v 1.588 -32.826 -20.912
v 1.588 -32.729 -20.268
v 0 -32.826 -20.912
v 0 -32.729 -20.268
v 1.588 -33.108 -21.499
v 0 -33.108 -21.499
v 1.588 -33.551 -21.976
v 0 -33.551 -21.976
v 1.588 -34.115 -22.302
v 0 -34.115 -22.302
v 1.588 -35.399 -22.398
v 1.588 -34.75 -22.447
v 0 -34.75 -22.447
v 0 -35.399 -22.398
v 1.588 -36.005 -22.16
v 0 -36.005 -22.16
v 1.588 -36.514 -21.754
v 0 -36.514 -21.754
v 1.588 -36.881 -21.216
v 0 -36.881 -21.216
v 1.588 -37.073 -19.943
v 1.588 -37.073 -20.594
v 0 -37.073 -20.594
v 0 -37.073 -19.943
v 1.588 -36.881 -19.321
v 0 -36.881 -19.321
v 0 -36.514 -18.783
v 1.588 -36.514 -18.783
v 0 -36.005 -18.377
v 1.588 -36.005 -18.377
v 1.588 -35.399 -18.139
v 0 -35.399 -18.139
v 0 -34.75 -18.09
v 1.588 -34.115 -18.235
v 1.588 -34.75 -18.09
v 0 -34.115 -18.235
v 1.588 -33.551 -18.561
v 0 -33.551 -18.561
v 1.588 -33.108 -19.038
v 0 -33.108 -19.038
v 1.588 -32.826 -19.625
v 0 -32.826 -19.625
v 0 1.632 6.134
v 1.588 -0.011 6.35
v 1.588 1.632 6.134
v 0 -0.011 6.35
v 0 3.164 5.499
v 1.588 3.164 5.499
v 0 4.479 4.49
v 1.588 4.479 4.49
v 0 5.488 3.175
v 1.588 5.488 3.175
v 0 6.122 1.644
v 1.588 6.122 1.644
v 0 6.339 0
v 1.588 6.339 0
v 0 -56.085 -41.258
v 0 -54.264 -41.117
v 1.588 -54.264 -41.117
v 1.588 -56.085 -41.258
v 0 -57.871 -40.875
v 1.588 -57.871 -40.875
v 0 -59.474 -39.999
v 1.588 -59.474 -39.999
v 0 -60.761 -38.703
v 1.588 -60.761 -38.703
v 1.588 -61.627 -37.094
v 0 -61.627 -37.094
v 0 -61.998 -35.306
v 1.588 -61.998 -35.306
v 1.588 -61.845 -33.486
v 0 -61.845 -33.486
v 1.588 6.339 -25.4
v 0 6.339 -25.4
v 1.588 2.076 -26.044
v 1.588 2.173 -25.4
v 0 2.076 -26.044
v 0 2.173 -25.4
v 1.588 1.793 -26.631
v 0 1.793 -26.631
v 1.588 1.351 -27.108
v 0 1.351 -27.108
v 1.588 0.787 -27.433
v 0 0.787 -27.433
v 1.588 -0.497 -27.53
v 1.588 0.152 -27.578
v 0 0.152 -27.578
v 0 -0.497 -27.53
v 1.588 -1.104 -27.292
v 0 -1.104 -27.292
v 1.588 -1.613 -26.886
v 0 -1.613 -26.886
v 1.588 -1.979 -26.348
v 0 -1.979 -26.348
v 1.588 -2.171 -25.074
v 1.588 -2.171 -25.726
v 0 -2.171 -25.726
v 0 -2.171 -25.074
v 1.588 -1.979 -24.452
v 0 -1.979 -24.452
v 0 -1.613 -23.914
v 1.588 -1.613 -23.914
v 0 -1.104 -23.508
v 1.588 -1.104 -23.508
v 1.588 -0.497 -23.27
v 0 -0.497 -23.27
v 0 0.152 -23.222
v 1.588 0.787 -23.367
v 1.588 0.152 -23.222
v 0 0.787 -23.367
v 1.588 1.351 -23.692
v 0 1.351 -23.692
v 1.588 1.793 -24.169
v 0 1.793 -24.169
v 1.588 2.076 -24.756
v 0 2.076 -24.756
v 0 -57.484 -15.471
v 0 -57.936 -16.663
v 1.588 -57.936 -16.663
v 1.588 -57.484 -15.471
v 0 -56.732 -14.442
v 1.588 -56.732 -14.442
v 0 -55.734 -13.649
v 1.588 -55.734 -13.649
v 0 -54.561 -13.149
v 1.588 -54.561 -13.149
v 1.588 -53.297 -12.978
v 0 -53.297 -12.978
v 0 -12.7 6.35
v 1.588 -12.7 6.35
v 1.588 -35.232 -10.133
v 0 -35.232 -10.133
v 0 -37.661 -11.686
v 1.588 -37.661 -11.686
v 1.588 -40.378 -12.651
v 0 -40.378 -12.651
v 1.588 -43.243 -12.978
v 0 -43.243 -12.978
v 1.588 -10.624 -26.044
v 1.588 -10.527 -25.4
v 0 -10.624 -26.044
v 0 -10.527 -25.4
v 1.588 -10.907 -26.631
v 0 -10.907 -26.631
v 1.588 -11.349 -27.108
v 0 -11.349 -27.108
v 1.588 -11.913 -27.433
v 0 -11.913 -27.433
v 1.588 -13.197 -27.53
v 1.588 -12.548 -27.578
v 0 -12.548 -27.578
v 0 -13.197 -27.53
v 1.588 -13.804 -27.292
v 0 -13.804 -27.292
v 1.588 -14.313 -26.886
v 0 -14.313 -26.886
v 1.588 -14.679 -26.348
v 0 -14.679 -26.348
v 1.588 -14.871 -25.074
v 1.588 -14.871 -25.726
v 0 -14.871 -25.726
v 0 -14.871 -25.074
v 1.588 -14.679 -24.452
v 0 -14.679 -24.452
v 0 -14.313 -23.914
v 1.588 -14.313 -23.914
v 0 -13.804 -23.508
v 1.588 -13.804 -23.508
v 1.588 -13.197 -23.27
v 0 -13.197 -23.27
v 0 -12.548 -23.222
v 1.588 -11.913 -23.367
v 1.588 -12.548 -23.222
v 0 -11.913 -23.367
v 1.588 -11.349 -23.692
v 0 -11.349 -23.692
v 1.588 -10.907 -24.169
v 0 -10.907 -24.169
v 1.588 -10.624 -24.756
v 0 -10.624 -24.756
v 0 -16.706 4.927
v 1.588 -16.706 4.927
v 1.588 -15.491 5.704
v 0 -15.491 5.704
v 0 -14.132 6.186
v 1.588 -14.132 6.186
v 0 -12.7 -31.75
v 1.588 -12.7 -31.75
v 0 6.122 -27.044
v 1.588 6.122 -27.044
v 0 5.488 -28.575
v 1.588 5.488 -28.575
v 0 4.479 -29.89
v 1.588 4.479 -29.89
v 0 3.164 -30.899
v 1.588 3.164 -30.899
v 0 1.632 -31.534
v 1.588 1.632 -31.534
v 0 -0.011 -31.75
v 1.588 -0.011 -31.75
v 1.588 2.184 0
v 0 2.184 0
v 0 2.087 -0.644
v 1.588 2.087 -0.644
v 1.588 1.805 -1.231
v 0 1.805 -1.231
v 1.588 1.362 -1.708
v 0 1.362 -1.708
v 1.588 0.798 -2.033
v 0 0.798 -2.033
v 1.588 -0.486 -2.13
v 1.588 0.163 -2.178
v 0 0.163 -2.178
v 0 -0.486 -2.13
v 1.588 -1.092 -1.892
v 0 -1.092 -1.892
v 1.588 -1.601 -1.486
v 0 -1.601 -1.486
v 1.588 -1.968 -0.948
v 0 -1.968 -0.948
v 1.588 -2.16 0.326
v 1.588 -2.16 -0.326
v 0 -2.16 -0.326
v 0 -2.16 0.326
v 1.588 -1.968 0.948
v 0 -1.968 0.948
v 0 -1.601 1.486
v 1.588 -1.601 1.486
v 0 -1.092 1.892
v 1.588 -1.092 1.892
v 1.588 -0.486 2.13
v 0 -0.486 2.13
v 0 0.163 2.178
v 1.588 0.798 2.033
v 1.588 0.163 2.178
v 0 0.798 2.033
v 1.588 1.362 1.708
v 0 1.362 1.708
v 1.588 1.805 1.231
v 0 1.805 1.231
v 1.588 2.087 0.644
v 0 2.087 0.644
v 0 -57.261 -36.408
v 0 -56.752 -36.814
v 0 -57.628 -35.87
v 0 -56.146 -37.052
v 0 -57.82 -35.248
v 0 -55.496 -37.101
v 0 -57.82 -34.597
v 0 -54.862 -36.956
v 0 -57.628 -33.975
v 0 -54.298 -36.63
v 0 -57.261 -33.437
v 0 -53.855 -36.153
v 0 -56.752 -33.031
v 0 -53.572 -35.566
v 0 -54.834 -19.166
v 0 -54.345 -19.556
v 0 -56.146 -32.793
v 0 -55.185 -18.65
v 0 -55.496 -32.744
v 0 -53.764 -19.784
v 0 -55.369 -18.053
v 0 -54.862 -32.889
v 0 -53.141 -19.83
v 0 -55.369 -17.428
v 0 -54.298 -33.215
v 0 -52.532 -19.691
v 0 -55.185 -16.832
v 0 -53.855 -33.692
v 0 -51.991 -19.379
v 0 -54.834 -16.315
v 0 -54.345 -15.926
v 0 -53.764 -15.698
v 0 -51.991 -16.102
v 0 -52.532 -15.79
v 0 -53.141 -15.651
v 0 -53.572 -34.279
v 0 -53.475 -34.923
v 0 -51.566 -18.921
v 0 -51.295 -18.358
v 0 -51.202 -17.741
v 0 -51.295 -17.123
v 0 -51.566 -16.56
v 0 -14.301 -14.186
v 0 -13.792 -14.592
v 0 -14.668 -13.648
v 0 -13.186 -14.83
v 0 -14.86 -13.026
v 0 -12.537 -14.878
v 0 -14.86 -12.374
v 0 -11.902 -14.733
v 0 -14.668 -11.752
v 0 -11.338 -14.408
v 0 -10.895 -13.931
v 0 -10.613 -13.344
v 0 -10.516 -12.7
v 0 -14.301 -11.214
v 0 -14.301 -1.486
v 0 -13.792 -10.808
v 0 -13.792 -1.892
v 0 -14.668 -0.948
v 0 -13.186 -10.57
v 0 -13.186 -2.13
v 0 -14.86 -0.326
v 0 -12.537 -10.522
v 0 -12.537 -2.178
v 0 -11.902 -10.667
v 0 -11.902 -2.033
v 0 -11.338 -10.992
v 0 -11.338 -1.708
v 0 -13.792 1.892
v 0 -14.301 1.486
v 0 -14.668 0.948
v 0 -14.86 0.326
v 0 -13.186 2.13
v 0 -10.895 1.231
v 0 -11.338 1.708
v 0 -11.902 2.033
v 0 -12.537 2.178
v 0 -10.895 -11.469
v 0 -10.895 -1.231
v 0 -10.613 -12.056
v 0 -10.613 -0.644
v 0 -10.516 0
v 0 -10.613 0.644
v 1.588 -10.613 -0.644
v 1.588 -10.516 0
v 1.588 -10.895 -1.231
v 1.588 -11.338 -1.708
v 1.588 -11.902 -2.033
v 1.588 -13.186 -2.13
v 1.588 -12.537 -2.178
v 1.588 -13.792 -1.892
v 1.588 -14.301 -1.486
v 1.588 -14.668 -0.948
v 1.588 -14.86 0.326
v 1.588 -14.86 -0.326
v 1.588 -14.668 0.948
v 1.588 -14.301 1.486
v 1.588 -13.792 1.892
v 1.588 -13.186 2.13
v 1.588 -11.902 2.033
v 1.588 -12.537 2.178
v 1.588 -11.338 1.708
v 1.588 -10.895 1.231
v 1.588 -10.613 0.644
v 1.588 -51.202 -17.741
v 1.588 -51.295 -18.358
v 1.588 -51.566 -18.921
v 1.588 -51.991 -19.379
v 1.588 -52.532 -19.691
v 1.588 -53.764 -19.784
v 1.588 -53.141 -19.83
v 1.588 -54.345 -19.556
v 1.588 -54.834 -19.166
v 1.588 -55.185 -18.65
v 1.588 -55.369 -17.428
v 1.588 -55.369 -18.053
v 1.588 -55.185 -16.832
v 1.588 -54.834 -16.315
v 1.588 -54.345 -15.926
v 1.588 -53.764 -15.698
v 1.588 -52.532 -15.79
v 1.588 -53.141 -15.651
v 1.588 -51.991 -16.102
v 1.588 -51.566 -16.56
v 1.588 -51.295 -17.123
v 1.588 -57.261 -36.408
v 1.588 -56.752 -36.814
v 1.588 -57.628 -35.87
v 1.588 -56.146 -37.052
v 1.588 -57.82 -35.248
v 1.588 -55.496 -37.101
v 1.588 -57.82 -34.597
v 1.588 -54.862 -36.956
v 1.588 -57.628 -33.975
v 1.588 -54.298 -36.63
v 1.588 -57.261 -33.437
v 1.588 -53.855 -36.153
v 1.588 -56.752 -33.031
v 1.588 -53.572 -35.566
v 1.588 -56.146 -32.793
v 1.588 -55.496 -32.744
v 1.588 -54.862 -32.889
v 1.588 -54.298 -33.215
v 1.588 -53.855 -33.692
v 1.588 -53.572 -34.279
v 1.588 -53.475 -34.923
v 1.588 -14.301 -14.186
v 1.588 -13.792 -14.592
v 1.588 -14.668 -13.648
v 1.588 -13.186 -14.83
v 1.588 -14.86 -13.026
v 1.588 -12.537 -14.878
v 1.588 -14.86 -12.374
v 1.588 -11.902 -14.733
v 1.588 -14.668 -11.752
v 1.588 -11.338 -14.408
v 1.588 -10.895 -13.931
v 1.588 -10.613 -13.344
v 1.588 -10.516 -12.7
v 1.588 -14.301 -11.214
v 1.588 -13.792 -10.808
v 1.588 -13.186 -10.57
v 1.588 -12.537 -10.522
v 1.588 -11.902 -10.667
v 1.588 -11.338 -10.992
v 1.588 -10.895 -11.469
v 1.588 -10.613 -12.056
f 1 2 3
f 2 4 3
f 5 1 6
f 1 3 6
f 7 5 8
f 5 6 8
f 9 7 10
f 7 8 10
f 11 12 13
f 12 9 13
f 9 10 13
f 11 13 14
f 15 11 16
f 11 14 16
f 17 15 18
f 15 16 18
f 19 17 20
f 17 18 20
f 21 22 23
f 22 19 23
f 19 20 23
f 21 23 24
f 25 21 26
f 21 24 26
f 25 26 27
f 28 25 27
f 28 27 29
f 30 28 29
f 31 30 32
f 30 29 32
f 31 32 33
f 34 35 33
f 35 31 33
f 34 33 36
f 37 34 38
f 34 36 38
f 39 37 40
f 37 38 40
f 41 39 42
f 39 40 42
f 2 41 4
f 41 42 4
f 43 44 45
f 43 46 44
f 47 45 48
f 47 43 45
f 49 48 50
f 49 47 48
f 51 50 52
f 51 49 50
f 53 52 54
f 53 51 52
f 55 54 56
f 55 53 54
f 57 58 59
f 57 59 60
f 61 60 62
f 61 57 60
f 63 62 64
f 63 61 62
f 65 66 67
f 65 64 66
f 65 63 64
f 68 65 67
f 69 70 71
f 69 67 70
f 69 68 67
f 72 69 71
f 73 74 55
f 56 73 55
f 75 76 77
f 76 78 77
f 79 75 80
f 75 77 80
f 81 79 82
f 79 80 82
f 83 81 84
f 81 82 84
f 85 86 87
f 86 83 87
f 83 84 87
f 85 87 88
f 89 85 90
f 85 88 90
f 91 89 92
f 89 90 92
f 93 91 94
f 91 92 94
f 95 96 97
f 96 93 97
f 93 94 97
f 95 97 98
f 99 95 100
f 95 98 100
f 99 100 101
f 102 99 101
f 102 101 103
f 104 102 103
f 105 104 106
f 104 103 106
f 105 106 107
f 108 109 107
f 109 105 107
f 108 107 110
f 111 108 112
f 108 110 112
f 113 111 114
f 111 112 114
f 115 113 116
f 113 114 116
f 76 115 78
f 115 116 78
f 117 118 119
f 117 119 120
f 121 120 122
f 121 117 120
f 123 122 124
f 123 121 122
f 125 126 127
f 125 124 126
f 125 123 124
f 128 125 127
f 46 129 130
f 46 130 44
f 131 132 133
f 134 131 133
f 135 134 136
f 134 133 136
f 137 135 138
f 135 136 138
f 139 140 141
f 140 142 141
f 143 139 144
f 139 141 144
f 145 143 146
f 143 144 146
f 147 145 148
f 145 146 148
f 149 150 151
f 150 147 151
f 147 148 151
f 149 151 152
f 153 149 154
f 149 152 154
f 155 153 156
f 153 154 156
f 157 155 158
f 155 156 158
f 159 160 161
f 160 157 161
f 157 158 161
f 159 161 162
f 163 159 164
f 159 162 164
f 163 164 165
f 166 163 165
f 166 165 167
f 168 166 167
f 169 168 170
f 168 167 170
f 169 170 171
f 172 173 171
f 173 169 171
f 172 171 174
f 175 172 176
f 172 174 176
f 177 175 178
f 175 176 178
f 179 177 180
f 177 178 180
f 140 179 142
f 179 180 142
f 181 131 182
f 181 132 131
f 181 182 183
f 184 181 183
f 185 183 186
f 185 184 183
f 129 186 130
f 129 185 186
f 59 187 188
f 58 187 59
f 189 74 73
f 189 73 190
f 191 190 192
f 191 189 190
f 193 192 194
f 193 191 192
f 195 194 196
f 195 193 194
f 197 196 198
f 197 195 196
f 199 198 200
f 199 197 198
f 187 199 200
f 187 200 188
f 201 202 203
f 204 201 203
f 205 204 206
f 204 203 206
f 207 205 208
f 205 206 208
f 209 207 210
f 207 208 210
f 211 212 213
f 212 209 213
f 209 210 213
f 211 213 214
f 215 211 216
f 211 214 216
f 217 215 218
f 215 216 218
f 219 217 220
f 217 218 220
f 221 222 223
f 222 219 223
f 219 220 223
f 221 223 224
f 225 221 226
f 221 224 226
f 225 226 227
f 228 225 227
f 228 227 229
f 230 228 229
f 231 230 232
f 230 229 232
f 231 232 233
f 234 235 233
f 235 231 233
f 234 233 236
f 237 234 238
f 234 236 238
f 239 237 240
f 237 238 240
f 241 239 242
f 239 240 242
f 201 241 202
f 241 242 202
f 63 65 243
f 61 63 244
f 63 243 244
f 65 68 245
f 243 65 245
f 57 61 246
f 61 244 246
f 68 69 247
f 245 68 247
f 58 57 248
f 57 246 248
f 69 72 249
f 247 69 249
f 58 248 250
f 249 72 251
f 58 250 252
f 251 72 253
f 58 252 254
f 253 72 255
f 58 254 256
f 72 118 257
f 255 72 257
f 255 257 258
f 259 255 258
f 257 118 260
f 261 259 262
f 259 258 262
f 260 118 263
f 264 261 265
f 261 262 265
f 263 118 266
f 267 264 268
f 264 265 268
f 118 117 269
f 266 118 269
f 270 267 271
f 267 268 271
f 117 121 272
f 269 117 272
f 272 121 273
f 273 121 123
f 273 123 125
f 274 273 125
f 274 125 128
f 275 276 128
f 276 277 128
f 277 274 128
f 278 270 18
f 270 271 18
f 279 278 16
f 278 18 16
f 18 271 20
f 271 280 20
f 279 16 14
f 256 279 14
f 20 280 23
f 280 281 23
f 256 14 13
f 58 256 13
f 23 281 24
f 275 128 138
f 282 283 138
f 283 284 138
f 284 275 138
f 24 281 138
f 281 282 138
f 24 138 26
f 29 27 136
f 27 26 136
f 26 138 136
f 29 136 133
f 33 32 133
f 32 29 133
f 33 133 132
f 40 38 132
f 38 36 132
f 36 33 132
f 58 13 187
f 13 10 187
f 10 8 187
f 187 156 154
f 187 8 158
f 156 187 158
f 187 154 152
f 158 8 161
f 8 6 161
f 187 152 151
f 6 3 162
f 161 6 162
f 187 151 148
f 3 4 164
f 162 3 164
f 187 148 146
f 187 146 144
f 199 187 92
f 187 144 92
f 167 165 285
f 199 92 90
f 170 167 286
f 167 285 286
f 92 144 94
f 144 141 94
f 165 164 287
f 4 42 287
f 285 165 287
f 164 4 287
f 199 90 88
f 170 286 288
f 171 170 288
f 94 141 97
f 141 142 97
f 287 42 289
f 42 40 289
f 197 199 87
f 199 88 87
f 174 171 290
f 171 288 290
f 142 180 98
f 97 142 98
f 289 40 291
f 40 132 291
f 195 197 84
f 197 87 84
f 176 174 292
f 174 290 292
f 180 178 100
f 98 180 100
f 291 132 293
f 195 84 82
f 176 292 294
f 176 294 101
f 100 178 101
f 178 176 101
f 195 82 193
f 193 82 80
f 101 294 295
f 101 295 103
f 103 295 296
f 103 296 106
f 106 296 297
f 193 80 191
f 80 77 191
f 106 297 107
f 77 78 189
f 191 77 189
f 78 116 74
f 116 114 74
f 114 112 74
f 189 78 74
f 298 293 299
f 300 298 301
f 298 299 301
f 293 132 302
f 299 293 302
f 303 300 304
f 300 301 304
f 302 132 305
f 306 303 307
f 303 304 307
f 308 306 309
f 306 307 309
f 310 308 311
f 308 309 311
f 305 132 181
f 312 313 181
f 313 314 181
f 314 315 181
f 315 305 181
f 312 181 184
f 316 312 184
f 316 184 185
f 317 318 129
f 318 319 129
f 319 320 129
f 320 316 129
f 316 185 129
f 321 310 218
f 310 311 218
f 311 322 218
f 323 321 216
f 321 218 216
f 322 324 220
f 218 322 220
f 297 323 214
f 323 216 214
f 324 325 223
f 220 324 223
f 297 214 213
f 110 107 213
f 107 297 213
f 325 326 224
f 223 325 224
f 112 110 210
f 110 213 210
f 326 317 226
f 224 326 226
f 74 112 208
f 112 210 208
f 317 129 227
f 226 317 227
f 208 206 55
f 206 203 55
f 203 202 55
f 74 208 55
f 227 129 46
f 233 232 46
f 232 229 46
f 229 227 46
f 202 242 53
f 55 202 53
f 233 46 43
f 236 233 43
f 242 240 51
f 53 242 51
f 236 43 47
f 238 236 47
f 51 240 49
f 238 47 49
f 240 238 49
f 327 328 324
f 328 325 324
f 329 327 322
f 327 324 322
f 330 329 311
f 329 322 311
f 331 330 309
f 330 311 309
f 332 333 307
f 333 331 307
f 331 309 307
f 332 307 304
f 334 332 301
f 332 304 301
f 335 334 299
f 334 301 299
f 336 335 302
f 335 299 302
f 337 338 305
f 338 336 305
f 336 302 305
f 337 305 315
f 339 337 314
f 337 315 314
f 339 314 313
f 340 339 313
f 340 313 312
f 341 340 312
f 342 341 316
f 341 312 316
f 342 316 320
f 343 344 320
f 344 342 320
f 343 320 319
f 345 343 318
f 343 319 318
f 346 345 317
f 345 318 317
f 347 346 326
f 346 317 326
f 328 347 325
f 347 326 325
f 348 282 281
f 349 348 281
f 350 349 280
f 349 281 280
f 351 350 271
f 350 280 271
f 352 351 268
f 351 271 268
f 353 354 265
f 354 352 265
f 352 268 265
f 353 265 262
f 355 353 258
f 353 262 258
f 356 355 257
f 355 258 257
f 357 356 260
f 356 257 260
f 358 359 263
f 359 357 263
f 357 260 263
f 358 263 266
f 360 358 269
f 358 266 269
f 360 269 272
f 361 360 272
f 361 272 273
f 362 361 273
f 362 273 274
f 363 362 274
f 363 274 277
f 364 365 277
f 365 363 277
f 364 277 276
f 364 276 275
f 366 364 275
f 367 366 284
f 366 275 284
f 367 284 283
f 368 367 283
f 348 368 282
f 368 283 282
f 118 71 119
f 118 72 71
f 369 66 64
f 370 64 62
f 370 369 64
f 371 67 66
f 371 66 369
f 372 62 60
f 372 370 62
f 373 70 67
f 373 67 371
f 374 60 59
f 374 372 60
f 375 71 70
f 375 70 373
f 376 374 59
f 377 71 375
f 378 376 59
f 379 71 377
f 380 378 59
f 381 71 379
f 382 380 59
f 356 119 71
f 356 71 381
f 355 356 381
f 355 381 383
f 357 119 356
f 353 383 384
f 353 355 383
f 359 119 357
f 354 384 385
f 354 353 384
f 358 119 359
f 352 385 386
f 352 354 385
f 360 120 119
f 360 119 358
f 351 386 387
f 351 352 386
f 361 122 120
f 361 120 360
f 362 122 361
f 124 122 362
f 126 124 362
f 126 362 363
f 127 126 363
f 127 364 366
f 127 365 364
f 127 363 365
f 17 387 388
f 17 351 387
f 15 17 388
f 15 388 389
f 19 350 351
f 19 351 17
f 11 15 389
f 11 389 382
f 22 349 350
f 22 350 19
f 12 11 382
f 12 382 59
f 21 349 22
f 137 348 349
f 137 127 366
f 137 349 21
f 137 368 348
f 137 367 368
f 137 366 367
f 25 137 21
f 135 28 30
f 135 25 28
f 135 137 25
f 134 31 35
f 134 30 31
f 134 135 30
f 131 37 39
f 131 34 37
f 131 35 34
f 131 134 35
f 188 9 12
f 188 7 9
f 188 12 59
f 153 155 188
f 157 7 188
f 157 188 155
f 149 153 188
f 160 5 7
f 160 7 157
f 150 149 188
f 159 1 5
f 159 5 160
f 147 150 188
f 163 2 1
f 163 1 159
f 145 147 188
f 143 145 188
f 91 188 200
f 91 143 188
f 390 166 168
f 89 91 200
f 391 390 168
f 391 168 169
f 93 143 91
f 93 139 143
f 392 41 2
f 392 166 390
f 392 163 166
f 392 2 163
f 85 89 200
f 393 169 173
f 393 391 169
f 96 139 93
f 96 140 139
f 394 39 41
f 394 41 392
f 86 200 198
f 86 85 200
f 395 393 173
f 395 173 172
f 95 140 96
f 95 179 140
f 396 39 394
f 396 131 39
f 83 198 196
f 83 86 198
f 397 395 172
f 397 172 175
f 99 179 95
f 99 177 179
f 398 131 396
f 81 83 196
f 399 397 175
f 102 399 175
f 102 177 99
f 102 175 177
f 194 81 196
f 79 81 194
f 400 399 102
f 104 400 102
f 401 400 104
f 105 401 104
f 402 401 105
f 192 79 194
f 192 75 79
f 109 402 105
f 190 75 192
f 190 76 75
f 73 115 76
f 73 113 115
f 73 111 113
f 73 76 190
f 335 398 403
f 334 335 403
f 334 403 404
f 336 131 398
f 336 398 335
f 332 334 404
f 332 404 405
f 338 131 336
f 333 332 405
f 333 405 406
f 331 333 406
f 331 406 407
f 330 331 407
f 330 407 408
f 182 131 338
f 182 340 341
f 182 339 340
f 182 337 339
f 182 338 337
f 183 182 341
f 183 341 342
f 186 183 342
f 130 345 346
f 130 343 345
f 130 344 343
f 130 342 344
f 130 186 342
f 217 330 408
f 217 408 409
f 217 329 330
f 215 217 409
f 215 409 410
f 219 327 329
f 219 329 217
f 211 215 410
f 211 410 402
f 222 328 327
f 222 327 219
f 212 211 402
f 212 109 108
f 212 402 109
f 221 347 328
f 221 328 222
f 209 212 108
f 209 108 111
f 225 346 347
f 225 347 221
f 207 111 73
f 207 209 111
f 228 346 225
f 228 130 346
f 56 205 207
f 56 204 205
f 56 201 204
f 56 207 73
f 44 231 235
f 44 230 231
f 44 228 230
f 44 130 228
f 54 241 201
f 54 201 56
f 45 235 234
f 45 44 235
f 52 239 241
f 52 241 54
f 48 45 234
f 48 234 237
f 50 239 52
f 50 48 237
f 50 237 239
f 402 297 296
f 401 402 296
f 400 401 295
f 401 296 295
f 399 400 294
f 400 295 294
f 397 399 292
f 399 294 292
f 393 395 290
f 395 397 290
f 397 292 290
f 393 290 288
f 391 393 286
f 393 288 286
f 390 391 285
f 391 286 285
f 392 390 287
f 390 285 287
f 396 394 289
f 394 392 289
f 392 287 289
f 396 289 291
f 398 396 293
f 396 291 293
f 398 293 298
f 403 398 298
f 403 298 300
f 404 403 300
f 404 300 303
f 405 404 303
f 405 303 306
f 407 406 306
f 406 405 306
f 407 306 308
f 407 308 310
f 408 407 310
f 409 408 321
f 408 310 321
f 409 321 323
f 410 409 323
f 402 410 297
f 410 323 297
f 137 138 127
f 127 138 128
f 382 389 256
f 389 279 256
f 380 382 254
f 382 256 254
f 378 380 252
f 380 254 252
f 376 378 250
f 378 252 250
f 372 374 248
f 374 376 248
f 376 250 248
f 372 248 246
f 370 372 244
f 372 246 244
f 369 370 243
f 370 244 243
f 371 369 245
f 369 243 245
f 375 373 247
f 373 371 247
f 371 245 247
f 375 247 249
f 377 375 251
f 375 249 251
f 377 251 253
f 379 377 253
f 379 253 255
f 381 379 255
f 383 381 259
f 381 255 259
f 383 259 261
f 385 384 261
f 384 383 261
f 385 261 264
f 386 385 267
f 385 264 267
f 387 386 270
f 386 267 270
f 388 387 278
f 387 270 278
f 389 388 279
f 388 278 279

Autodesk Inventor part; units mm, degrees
ref_plane "YZ Plane" through (0, 0, 0) normal (1, 0, 0) x (0, 1, 0)
ref_plane "XZ Plane" through (0, 0, 0) normal (0, 1, 0) x (-1, 0, 0)
ref_plane "XY Plane" through (0, 0, 0) normal (0, 0, 1) x (1, 0, 0)
sketch "maiin" plane through (0, 0, 0) normal (0, 0, 1) x (1, 0, 0)
  circle A0 centre (-6.5018, 3.4753) radius 2.1844
  line L0 (-6.8203, 13.6107) -> (11.7059, 28.671)
  circle A1 centre (-27.2482, -11.1789) radius 2.1844
  arc A2 (-33.4335, -9.7418) -> (-25.8521, -17.3735) centre (-27.2482, -11.1789) ccw
  line L1 (34.75, -1.6563) -> (34.75, 23.7437)
  line L2 (15.7114, 30.0937) -> (28.4, 30.0937)
  circle A3 centre (28.4114, 23.7437) radius 2.1844
  circle A4 centre (28.4, -1.6563) radius 2.1844
  circle A5 centre (15.7114, 23.7437) radius 2.1844
  circle A6 centre (15.7, -1.6563) radius 2.1844
  arc A7 (34.75, 23.7437) -> (28.4, 30.0937) centre (28.4, 23.7437) ccw
  arc A8 (15.7114, 30.0937) -> (11.7059, 28.671) centre (15.7114, 23.7437) ccw
  arc A9 (28.4, -8.0063) -> (34.75, -1.6563) centre (28.4, -1.6563) ccw
  line L3 (28.4, -8.0063) -> (15.7114, -8.0063)
  line L4 (15.7114, -8.0063) -> (-25.8521, -17.3735)
  circle A10 centre (-24.886, 6.0028) radius 2.0955
  arc A11 (-24.886, 10.7653) -> (-29.5249, 7.0806) centre (-24.886, 6.0028) ccw
  line L5 (-33.4335, -9.7418) -> (-29.5249, 7.0806)
  line L6 (-14.8313, 10.7653) -> (-24.886, 10.7653)
  arc A12 (-14.8313, 10.7653) -> (-6.8203, 13.6107) centre (-14.8313, 23.4653) ccw
  point P0 (10.0881, 4.3711)
  point P1 (32.8902, 28.2338)
  dimension "d0" = 12.7
  dimension "d6" = 4.3688
  dimension "d9" = 12.7
  dimension "d10" = 25.4
  dimension "d11" = 12.7
  dimension "d12" = 25.4
  dimension "d14" = 4.191
  dimension "d15" = 9.525
  dimension "d16" = 12.7
sketch "Sketch1" plane through (0, 0, 0) normal (1, 0, 0) x (0, 1, 0)
  circle A0 centre (-12.7, -12.7) radius 2.1844
  circle A1 centre (-34.9132, -20.2684) radius 2.1844
  line L0 (-35.2318, -10.133) -> (-16.7055, 4.9273)
  circle A2 centre (-55.6596, -34.9226) radius 2.1844
  arc A3 (-61.8449, -33.4855) -> (-54.2635, -41.1172) centre (-55.6596, -34.9226) ccw
  line L1 (6.3386, -25.4) -> (6.3386, 0)
  line L2 (-12.7, 6.35) -> (-0.0114, 6.35)
  circle A4 centre (0, 0) radius 2.1844
  circle A5 centre (-0.0114, -25.4) radius 2.1844
  circle A6 centre (-12.7, 0) radius 2.1844
  circle A7 centre (-12.7114, -25.4) radius 2.1844
  arc A8 (6.3386, 0) -> (-0.0114, 6.35) centre (-0.0114, 0) ccw
  arc A9 (-12.7, 6.35) -> (-16.7055, 4.9273) centre (-12.7, 0) ccw
  arc A10 (-0.0114, -31.75) -> (6.3386, -25.4) centre (-0.0114, -25.4) ccw
  line L3 (-0.0114, -31.75) -> (-12.7, -31.75)
  line L4 (-12.7, -31.75) -> (-54.2635, -41.1172)
  circle A11 centre (-53.2974, -17.7408) radius 2.0955
  arc A12 (-53.2974, -12.9783) -> (-57.9364, -16.663) centre (-53.2974, -17.7408) ccw
  line L5 (-61.8449, -33.4855) -> (-57.9364, -16.663)
  line L6 (-43.2428, -12.9783) -> (-53.2974, -12.9783)
  arc A13 (-43.2428, -12.9783) -> (-35.2318, -10.133) centre (-43.2428, -0.2783) ccw
  dimension "d17" = 4.3688
extrude "Extrusion1" add sketch "Sketch1" along normal blind 1.5875
properties part number "Angle Brace Gusset" material "Acetal Resin, White"
